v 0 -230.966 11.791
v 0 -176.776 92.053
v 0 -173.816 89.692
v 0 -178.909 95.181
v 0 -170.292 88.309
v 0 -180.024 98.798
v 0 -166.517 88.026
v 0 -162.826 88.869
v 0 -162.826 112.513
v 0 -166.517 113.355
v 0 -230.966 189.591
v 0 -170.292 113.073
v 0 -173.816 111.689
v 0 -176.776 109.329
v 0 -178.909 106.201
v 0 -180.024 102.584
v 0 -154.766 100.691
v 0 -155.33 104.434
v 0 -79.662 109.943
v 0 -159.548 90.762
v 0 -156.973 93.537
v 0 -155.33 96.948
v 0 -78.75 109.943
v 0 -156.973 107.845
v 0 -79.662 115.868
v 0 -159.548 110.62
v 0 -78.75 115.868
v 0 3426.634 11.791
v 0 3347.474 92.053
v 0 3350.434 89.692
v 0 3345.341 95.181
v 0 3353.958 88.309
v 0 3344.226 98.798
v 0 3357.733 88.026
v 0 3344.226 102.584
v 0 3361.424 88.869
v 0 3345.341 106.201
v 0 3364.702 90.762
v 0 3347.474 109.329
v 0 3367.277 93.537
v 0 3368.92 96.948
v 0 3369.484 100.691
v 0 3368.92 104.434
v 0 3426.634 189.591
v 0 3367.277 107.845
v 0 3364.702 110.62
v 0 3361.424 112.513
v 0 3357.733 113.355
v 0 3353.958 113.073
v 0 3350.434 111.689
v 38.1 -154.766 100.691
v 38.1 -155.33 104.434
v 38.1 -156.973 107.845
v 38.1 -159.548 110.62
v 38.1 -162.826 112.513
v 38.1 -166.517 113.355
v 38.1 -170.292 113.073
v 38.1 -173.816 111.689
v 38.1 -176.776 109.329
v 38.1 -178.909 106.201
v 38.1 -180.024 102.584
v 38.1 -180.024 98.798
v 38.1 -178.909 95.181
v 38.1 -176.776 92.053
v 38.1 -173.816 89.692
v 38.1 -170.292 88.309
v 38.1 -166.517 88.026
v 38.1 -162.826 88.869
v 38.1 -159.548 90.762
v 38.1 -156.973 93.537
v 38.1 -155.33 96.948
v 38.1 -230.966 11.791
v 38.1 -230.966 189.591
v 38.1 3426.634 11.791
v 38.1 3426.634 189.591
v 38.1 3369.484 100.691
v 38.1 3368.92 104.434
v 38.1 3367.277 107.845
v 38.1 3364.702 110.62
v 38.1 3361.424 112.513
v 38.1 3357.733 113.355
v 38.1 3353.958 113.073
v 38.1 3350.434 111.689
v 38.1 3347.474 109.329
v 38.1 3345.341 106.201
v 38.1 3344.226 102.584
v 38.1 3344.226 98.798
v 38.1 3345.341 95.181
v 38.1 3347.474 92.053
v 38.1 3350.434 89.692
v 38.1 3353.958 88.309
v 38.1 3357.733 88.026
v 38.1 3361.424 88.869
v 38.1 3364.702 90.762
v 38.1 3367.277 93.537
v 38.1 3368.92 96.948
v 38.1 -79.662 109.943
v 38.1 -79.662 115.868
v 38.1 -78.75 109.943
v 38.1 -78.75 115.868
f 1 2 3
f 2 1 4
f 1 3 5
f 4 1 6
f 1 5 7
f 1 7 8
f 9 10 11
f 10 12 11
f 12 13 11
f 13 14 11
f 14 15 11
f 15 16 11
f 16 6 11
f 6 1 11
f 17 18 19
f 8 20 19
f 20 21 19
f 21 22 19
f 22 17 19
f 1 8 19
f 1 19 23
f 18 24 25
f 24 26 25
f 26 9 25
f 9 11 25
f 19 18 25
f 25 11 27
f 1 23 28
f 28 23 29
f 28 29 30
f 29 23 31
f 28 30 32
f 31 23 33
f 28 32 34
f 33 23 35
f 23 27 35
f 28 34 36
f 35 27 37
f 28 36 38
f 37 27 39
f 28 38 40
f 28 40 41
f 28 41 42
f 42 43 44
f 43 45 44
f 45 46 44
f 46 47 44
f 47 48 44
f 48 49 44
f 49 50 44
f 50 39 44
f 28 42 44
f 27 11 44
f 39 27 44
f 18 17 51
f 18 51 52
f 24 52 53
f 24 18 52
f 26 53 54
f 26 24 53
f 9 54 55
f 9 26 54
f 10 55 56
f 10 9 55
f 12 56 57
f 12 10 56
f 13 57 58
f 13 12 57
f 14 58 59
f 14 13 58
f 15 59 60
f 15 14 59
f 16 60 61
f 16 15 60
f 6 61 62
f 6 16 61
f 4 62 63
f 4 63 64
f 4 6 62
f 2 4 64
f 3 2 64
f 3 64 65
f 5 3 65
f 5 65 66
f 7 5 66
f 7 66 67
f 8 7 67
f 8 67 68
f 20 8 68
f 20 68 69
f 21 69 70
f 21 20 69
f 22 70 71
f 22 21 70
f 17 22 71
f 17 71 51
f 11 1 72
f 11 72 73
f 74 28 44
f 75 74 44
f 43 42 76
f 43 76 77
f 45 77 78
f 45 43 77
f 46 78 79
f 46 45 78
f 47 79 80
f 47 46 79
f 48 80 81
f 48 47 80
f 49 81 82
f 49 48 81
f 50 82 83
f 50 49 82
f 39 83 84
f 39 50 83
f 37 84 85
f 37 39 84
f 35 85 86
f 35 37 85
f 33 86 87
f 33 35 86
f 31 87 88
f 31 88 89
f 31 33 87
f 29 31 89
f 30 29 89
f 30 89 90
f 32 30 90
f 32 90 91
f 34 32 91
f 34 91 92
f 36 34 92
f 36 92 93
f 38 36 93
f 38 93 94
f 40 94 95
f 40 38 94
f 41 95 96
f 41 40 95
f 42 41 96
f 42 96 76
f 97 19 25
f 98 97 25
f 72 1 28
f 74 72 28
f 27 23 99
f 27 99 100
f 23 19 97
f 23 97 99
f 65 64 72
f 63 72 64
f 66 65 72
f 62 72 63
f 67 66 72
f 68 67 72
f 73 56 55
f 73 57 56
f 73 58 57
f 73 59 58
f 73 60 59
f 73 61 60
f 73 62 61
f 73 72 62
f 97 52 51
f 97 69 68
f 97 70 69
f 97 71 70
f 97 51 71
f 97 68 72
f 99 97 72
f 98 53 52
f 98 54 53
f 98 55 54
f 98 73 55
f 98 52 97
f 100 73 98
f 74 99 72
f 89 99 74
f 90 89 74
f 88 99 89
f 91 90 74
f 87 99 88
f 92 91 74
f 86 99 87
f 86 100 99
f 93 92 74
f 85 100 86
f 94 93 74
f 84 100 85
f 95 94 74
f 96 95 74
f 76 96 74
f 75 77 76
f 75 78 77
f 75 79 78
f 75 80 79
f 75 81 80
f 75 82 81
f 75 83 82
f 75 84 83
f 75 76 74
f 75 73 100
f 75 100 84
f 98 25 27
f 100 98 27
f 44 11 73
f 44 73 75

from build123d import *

# Parameters (mm, degrees)
F0_W     = 3657.6
F0_H     = 177.8
F0_R     = 12.7
F0_W_2   = 0.911512
F0_H_2   = 5.924806
F1_DEPTH = 38.1


with BuildPart() as f1:
    # F0 (on Right) → F1 (new body)
    with BuildSketch(Plane.YZ):
        with Locations((1597.833786, 100.690947)):
            Rectangle(F0_W, F0_H)
        with Locations((-167.466214, 100.690947)):
            Circle(F0_R, mode=Mode.SUBTRACT)
        with Locations((-79.20612, 112.905398)):
            Rectangle(F0_W_2, F0_H_2, mode=Mode.SUBTRACT)
        with Locations((3356.783786, 100.690947)):
            Circle(F0_R, mode=Mode.SUBTRACT)
    extrude(amount=F1_DEPTH)


solid = f1.part
